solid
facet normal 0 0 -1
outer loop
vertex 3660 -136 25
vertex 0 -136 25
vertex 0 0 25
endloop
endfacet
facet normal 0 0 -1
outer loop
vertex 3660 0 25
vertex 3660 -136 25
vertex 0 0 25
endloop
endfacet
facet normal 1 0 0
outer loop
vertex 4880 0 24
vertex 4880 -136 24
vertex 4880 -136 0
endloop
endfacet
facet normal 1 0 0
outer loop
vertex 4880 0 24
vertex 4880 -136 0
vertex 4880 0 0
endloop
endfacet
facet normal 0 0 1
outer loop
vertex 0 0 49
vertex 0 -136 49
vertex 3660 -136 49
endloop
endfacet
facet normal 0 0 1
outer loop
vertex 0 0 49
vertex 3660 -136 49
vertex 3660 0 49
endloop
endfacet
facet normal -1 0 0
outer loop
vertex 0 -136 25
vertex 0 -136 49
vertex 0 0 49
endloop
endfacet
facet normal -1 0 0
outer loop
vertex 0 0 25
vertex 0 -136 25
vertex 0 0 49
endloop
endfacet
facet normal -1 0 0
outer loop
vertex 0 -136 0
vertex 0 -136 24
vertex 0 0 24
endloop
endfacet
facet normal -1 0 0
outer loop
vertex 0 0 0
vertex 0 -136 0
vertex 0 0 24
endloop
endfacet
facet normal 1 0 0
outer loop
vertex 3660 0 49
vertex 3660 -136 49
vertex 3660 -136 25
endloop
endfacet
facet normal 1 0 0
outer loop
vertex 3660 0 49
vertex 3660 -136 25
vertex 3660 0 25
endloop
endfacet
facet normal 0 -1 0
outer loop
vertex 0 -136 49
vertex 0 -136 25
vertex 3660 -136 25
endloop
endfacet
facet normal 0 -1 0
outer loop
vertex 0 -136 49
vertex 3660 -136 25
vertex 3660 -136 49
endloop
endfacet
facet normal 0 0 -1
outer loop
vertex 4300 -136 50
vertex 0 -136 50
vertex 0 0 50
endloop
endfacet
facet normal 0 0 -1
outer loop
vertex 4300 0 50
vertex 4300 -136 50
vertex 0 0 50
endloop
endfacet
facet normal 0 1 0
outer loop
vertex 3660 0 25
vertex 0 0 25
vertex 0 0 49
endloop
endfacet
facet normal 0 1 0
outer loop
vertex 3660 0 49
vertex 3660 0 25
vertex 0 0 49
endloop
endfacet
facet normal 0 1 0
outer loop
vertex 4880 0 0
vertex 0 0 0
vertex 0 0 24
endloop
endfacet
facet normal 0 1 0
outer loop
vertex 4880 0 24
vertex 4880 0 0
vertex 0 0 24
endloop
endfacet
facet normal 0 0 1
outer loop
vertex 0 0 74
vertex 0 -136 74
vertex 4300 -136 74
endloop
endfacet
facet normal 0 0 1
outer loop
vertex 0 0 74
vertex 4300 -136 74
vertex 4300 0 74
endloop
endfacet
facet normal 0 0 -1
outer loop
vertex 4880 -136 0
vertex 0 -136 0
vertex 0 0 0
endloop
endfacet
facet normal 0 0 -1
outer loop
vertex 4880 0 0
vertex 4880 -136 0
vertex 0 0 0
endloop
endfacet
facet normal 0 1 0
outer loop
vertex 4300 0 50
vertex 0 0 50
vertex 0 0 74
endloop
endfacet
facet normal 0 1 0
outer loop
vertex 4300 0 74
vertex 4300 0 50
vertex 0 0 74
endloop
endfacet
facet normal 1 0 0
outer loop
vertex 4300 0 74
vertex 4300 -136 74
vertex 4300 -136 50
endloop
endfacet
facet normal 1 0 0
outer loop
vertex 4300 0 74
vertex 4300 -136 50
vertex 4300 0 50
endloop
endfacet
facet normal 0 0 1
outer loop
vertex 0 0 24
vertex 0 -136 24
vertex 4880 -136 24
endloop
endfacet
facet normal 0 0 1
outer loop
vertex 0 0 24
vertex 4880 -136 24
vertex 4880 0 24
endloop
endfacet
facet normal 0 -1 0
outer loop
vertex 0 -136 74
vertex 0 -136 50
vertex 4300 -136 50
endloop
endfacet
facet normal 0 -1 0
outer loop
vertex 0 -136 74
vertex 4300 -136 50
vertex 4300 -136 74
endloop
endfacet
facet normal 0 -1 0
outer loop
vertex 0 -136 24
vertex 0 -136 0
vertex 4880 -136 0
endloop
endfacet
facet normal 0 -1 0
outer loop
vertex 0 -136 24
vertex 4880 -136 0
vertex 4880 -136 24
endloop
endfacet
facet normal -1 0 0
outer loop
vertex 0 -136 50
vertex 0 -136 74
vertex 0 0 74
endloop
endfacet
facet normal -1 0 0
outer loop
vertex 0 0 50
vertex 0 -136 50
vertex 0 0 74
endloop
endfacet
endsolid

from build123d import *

# Parameters (mm, degrees)
F0_W     = 136
F0_H     = 24
F1_DEPTH = 4880
F2_DEPTH = 3660
F3_DEPTH = 4300


with BuildPart() as f1:
    # F0 (on Right) → F1 (new body)
    with BuildSketch(Plane.YZ):
        with Locations((-68, 12)):
            Rectangle(F0_W, F0_H)
    extrude(amount=F1_DEPTH)


with BuildPart() as f2:
    # F0 (on Right) → F2 (new body)
    with BuildSketch(Plane.YZ):
        with Locations((-68, 37)):
            Rectangle(F0_W, F0_H)
    extrude(amount=F2_DEPTH)


with BuildPart() as f3:
    # F0 (on Right) → F3 (new body)
    with BuildSketch(Plane.YZ):
        with Locations((-68, 62)):
            Rectangle(F0_W, F0_H)
    extrude(amount=F3_DEPTH)


solid = Compound([f1.part, f2.part, f3.part])
